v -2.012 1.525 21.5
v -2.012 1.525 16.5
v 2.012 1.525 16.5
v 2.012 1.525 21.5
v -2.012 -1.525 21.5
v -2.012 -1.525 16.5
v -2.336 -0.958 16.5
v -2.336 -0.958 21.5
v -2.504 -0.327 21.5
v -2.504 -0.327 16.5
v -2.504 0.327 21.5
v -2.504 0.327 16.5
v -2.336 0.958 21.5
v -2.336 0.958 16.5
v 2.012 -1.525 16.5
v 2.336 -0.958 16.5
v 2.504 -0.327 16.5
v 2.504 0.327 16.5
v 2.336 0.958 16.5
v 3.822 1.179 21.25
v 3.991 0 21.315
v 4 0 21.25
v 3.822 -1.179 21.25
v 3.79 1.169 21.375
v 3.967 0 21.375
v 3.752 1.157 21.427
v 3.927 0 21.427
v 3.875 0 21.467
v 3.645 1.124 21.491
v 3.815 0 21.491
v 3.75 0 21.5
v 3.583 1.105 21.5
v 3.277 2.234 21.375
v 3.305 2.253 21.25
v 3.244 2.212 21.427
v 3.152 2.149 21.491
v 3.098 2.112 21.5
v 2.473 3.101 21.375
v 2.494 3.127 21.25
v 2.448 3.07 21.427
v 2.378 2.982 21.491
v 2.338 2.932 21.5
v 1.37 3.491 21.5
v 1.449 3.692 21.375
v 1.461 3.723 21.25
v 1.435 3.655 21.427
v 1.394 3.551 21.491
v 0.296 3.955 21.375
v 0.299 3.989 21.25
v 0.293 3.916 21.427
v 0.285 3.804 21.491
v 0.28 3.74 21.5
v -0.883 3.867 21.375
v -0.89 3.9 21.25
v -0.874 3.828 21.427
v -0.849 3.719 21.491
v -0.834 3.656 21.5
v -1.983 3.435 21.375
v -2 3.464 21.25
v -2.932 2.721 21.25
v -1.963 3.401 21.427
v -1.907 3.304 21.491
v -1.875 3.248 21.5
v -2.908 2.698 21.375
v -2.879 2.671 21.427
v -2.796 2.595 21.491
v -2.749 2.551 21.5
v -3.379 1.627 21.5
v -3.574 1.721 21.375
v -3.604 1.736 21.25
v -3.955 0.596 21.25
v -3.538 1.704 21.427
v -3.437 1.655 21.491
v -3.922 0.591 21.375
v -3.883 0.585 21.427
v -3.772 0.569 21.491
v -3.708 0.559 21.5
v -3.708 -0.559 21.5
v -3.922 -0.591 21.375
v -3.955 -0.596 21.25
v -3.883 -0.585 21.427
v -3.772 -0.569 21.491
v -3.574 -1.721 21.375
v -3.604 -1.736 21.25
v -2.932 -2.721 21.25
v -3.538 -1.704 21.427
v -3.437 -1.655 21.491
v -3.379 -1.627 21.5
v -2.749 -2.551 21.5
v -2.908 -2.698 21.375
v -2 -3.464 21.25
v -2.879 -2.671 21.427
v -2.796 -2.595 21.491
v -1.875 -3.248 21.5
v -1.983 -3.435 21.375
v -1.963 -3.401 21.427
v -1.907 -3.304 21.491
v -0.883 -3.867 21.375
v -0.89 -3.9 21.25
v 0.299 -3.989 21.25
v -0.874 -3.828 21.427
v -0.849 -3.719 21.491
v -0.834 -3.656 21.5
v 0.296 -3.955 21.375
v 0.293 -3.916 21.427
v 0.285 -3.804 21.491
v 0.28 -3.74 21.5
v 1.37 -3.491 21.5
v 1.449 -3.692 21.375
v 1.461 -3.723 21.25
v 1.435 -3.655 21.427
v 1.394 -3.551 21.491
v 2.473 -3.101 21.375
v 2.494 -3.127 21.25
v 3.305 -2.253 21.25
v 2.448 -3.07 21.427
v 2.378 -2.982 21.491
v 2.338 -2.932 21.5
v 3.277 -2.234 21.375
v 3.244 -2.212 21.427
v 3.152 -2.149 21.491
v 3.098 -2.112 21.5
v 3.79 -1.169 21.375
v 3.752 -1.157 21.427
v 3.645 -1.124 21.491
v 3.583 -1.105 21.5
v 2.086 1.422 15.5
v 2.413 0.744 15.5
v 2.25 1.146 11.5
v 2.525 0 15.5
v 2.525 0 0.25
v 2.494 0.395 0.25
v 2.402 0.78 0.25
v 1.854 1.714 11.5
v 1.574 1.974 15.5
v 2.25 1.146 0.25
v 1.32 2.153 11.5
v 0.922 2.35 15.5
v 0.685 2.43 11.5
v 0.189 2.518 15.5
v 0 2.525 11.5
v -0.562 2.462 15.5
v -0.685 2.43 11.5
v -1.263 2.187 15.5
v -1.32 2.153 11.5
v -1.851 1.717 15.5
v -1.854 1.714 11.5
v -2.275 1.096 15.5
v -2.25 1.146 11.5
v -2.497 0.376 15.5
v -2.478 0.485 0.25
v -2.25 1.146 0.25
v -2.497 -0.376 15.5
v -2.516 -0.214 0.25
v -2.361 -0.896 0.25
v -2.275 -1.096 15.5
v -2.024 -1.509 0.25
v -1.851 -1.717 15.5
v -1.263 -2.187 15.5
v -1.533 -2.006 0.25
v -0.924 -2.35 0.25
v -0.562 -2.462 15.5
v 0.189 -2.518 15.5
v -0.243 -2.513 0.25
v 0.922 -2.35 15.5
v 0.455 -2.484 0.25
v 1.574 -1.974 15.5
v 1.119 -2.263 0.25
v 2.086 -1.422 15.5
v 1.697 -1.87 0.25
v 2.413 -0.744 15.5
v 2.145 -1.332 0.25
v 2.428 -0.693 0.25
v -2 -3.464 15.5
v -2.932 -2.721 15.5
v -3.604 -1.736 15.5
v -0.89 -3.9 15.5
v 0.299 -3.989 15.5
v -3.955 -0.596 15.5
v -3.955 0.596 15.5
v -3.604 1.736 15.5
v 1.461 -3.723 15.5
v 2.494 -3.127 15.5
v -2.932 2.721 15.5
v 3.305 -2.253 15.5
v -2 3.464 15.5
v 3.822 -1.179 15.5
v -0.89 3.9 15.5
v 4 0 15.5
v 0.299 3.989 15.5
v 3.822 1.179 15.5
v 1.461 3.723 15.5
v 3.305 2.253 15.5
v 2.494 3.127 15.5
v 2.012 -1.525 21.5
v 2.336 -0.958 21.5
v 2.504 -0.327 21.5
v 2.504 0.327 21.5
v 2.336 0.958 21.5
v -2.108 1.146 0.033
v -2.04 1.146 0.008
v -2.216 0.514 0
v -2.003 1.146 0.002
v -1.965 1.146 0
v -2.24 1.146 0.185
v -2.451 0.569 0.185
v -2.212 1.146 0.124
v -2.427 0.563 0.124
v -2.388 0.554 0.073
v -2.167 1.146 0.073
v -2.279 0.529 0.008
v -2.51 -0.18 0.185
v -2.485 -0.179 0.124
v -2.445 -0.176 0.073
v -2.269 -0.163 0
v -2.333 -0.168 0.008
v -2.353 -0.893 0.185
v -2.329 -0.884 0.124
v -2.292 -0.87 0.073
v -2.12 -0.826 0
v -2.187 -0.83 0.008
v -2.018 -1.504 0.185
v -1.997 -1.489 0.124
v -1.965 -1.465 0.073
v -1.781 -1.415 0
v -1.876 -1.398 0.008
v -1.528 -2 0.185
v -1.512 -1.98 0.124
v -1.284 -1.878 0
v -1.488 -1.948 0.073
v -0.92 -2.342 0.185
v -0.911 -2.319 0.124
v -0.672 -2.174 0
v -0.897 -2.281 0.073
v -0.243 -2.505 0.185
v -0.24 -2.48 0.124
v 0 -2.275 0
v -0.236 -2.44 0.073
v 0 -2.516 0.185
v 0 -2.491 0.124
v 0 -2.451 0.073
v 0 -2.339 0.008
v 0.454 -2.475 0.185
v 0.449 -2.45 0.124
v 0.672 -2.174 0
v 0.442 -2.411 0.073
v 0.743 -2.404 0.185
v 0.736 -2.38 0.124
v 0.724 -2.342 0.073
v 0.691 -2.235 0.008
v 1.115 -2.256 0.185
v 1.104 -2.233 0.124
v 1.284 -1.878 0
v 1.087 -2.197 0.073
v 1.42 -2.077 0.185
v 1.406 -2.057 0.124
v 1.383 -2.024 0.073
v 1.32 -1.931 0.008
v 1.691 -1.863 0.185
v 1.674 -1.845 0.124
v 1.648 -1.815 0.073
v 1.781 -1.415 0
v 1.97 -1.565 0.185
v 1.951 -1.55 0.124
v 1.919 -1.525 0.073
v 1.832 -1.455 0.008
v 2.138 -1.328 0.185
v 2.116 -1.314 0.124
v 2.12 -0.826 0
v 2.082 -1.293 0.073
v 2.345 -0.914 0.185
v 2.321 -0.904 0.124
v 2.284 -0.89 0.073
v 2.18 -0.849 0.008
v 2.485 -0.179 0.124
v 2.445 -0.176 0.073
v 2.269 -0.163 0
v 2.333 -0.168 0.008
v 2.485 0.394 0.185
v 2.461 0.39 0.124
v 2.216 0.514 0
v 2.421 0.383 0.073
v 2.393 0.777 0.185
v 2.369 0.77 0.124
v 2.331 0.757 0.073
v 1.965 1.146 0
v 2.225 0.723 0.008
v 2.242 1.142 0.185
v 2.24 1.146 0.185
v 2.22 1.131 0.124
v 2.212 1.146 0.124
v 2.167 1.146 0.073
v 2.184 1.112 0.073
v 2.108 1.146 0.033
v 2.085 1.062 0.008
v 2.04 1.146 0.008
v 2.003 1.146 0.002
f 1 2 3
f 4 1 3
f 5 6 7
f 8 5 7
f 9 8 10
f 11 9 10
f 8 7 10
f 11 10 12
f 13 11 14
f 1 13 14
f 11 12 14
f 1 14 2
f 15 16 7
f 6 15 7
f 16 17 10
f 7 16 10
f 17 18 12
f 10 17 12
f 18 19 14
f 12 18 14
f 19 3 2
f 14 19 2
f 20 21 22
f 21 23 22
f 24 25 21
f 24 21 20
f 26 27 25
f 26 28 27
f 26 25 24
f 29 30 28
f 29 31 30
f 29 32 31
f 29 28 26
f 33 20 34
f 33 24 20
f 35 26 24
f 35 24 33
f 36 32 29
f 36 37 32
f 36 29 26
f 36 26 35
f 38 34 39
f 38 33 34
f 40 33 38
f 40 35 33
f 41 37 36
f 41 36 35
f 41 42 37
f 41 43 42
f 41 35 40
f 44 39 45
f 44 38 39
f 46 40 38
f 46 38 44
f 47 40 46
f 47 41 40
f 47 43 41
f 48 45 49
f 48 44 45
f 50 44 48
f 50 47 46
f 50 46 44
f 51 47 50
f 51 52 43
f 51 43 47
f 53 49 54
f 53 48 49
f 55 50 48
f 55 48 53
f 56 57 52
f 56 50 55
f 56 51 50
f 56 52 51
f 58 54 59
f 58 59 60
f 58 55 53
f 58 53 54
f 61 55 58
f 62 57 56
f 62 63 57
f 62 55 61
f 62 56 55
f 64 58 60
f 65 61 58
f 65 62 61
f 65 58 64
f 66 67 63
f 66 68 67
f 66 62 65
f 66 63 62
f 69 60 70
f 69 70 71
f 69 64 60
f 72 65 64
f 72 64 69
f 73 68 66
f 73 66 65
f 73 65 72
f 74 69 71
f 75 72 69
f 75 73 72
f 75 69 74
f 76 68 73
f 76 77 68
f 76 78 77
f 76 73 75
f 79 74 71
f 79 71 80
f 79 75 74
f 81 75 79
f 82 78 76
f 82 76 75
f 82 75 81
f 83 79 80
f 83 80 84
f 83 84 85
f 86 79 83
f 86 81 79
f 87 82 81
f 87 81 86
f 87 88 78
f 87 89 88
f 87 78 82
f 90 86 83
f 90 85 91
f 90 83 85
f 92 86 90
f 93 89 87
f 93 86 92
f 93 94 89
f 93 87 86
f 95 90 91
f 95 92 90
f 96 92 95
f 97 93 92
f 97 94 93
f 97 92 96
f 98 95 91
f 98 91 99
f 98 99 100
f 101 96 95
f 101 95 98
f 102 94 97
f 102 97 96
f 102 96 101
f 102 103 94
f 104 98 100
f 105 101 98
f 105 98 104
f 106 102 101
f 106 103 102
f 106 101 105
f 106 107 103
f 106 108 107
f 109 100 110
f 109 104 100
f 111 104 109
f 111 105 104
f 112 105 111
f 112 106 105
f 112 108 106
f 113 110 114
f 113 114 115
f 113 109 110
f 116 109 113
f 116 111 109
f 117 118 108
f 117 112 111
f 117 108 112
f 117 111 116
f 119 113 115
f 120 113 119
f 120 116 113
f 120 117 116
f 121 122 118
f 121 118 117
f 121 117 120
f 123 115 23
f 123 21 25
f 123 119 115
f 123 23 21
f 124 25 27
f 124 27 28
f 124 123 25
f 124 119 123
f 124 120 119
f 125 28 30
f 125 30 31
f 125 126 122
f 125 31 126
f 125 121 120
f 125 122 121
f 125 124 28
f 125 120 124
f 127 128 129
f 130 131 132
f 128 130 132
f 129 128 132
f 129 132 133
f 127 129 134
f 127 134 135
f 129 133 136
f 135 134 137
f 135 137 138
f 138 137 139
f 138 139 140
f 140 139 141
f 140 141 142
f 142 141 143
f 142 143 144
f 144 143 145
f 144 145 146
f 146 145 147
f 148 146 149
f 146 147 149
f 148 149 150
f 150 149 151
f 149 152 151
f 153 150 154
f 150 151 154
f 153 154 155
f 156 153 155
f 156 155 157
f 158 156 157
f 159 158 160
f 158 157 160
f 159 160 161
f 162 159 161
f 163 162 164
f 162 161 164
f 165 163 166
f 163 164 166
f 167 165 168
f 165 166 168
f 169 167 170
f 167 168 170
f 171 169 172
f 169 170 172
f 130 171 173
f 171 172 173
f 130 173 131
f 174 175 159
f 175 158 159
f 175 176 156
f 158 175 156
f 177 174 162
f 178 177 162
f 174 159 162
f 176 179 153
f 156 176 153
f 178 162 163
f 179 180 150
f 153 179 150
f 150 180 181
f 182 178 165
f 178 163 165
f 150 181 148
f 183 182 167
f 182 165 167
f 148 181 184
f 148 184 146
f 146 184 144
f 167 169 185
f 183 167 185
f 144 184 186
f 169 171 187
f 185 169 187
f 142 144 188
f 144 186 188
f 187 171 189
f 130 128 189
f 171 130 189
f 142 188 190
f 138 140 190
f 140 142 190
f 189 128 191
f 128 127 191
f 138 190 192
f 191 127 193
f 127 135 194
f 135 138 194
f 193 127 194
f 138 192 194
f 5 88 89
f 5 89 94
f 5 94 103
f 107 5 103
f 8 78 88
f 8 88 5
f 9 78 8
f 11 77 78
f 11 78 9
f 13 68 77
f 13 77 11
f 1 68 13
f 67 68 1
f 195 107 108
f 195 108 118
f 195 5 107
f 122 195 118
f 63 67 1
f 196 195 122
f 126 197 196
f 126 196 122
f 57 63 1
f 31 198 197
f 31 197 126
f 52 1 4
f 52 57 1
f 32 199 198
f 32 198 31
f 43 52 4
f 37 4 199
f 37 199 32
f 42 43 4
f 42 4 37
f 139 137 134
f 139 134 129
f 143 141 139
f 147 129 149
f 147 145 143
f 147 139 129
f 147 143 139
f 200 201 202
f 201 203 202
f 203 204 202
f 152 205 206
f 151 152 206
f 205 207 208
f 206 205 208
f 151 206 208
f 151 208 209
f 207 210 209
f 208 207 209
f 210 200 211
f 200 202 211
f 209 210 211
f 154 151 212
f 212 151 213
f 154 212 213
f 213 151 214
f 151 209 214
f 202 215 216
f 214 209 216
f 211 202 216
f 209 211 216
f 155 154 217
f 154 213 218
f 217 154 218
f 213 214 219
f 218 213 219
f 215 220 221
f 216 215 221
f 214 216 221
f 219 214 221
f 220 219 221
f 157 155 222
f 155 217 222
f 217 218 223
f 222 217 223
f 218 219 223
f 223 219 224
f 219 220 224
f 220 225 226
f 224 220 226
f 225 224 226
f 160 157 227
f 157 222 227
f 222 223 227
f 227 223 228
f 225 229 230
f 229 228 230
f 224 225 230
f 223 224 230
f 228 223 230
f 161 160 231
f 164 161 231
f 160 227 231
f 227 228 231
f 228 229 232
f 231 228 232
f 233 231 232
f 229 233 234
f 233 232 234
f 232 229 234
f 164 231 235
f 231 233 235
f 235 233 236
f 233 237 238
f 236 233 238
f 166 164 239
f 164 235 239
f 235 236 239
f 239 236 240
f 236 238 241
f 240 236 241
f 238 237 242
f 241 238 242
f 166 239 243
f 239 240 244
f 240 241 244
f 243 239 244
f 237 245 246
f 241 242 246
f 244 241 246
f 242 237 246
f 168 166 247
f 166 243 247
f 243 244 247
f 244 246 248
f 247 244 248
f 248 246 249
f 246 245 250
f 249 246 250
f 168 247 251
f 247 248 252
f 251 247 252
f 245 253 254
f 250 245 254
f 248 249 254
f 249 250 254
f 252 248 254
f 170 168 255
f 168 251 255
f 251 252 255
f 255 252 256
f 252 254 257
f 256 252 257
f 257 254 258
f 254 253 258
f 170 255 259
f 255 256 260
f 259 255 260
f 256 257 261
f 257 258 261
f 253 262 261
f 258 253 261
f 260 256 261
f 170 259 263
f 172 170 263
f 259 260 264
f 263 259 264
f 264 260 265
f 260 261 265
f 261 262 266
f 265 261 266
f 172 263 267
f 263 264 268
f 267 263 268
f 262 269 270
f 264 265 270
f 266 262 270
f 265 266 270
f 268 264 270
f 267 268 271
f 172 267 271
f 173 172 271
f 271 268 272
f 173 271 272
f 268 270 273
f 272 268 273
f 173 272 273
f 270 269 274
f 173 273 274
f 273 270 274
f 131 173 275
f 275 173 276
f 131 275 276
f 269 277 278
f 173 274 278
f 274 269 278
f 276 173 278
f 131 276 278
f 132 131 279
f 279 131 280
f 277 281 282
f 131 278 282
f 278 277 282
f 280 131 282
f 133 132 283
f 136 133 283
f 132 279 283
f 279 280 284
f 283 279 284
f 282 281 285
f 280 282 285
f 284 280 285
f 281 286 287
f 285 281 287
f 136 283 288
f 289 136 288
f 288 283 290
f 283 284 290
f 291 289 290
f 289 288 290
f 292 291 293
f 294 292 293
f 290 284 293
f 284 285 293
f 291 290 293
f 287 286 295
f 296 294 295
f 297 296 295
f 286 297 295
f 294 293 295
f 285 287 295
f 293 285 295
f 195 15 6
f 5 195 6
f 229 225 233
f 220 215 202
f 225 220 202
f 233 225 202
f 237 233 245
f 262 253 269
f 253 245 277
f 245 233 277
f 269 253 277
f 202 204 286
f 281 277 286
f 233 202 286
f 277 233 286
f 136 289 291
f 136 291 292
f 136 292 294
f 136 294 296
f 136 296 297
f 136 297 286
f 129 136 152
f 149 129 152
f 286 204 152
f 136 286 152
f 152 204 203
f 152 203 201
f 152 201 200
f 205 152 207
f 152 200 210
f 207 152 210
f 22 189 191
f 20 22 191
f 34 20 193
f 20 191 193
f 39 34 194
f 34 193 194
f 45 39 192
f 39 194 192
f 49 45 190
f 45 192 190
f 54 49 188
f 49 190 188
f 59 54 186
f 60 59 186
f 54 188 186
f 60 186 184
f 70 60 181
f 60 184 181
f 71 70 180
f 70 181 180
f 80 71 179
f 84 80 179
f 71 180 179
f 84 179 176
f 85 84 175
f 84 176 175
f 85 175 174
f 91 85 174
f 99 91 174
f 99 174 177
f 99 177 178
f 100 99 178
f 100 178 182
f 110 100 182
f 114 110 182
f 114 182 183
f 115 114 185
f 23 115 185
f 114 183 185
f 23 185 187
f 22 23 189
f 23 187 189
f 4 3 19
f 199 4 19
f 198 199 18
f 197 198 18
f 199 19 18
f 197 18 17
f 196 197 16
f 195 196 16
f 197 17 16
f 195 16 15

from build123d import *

# Parameters (mm, degrees)
SKETCH1_R           = 2.525
BOSS_EXTRUDE1_DEPTH = 15.5
SKETCH2_R           = 4
BOSS_EXTRUDE2_DEPTH = 6
CUT_EXTRUDE1_START  = -5
CUT_EXTRUDE1_DEPTH  = 5
FILLET2_R           = 0.25
FILLET3_R           = 0.25
CUT_EXTRUDE2_DEPTH  = 11.5


with BuildPart() as part:
    # Sketch1 → Boss-Extrude1 (new body)
    with BuildSketch(Plane.XY):
        Circle(SKETCH1_R)
    extrude(amount=BOSS_EXTRUDE1_DEPTH)

    # Sketch2 → Boss-Extrude2 (add)
    with BuildSketch(Plane.XY.offset(15.5)):
        Circle(SKETCH2_R)
    extrude(amount=BOSS_EXTRUDE2_DEPTH)

    # Sketch3 → Cut-Extrude1 (cut)
    with BuildSketch(Plane.XY.offset(21.5).offset(CUT_EXTRUDE1_START)):
        with BuildLine():
            Line((-2.01246118, 1.525), (2.01246118, 1.525))
            ThreePointArc((2.01246118, 1.525), (2.525, 0), (2.01246118, -1.525))
            Line((2.01246118, -1.525), (-2.01246118, -1.525))
            ThreePointArc((-2.01246118, -1.525), (-2.525, 0), (-2.01246118, 1.525))
        make_face()
    extrude(amount=CUT_EXTRUDE1_DEPTH, mode=Mode.SUBTRACT)

    # Fillet2
    fillet2_edges = [part.edges().sort_by_distance(p)[0] for p in [
        (-4, 0, 21.5),
    ]]
    fillet(fillet2_edges, radius=FILLET2_R)

    # Fillet3
    fillet3_edges = [part.edges().sort_by_distance(p)[0] for p in [
        (-2.525, 0, 0),
    ]]
    fillet(fillet3_edges, radius=FILLET3_R)

    # Sketch4 → Cut-Extrude2 (cut)
    with BuildSketch(Plane(origin=(0, 0, 0), x_dir=(-1, 0, 0), z_dir=(0, 0, -1))):
        with BuildLine():
            Line((-2.25, 1.145916664), (2.25, 1.145916664))
            ThreePointArc((2.25, 1.145916664), (0, 2.525), (-2.25, 1.145916664))
        make_face()
    extrude(amount=-CUT_EXTRUDE2_DEPTH, mode=Mode.SUBTRACT)


solid = part.part
